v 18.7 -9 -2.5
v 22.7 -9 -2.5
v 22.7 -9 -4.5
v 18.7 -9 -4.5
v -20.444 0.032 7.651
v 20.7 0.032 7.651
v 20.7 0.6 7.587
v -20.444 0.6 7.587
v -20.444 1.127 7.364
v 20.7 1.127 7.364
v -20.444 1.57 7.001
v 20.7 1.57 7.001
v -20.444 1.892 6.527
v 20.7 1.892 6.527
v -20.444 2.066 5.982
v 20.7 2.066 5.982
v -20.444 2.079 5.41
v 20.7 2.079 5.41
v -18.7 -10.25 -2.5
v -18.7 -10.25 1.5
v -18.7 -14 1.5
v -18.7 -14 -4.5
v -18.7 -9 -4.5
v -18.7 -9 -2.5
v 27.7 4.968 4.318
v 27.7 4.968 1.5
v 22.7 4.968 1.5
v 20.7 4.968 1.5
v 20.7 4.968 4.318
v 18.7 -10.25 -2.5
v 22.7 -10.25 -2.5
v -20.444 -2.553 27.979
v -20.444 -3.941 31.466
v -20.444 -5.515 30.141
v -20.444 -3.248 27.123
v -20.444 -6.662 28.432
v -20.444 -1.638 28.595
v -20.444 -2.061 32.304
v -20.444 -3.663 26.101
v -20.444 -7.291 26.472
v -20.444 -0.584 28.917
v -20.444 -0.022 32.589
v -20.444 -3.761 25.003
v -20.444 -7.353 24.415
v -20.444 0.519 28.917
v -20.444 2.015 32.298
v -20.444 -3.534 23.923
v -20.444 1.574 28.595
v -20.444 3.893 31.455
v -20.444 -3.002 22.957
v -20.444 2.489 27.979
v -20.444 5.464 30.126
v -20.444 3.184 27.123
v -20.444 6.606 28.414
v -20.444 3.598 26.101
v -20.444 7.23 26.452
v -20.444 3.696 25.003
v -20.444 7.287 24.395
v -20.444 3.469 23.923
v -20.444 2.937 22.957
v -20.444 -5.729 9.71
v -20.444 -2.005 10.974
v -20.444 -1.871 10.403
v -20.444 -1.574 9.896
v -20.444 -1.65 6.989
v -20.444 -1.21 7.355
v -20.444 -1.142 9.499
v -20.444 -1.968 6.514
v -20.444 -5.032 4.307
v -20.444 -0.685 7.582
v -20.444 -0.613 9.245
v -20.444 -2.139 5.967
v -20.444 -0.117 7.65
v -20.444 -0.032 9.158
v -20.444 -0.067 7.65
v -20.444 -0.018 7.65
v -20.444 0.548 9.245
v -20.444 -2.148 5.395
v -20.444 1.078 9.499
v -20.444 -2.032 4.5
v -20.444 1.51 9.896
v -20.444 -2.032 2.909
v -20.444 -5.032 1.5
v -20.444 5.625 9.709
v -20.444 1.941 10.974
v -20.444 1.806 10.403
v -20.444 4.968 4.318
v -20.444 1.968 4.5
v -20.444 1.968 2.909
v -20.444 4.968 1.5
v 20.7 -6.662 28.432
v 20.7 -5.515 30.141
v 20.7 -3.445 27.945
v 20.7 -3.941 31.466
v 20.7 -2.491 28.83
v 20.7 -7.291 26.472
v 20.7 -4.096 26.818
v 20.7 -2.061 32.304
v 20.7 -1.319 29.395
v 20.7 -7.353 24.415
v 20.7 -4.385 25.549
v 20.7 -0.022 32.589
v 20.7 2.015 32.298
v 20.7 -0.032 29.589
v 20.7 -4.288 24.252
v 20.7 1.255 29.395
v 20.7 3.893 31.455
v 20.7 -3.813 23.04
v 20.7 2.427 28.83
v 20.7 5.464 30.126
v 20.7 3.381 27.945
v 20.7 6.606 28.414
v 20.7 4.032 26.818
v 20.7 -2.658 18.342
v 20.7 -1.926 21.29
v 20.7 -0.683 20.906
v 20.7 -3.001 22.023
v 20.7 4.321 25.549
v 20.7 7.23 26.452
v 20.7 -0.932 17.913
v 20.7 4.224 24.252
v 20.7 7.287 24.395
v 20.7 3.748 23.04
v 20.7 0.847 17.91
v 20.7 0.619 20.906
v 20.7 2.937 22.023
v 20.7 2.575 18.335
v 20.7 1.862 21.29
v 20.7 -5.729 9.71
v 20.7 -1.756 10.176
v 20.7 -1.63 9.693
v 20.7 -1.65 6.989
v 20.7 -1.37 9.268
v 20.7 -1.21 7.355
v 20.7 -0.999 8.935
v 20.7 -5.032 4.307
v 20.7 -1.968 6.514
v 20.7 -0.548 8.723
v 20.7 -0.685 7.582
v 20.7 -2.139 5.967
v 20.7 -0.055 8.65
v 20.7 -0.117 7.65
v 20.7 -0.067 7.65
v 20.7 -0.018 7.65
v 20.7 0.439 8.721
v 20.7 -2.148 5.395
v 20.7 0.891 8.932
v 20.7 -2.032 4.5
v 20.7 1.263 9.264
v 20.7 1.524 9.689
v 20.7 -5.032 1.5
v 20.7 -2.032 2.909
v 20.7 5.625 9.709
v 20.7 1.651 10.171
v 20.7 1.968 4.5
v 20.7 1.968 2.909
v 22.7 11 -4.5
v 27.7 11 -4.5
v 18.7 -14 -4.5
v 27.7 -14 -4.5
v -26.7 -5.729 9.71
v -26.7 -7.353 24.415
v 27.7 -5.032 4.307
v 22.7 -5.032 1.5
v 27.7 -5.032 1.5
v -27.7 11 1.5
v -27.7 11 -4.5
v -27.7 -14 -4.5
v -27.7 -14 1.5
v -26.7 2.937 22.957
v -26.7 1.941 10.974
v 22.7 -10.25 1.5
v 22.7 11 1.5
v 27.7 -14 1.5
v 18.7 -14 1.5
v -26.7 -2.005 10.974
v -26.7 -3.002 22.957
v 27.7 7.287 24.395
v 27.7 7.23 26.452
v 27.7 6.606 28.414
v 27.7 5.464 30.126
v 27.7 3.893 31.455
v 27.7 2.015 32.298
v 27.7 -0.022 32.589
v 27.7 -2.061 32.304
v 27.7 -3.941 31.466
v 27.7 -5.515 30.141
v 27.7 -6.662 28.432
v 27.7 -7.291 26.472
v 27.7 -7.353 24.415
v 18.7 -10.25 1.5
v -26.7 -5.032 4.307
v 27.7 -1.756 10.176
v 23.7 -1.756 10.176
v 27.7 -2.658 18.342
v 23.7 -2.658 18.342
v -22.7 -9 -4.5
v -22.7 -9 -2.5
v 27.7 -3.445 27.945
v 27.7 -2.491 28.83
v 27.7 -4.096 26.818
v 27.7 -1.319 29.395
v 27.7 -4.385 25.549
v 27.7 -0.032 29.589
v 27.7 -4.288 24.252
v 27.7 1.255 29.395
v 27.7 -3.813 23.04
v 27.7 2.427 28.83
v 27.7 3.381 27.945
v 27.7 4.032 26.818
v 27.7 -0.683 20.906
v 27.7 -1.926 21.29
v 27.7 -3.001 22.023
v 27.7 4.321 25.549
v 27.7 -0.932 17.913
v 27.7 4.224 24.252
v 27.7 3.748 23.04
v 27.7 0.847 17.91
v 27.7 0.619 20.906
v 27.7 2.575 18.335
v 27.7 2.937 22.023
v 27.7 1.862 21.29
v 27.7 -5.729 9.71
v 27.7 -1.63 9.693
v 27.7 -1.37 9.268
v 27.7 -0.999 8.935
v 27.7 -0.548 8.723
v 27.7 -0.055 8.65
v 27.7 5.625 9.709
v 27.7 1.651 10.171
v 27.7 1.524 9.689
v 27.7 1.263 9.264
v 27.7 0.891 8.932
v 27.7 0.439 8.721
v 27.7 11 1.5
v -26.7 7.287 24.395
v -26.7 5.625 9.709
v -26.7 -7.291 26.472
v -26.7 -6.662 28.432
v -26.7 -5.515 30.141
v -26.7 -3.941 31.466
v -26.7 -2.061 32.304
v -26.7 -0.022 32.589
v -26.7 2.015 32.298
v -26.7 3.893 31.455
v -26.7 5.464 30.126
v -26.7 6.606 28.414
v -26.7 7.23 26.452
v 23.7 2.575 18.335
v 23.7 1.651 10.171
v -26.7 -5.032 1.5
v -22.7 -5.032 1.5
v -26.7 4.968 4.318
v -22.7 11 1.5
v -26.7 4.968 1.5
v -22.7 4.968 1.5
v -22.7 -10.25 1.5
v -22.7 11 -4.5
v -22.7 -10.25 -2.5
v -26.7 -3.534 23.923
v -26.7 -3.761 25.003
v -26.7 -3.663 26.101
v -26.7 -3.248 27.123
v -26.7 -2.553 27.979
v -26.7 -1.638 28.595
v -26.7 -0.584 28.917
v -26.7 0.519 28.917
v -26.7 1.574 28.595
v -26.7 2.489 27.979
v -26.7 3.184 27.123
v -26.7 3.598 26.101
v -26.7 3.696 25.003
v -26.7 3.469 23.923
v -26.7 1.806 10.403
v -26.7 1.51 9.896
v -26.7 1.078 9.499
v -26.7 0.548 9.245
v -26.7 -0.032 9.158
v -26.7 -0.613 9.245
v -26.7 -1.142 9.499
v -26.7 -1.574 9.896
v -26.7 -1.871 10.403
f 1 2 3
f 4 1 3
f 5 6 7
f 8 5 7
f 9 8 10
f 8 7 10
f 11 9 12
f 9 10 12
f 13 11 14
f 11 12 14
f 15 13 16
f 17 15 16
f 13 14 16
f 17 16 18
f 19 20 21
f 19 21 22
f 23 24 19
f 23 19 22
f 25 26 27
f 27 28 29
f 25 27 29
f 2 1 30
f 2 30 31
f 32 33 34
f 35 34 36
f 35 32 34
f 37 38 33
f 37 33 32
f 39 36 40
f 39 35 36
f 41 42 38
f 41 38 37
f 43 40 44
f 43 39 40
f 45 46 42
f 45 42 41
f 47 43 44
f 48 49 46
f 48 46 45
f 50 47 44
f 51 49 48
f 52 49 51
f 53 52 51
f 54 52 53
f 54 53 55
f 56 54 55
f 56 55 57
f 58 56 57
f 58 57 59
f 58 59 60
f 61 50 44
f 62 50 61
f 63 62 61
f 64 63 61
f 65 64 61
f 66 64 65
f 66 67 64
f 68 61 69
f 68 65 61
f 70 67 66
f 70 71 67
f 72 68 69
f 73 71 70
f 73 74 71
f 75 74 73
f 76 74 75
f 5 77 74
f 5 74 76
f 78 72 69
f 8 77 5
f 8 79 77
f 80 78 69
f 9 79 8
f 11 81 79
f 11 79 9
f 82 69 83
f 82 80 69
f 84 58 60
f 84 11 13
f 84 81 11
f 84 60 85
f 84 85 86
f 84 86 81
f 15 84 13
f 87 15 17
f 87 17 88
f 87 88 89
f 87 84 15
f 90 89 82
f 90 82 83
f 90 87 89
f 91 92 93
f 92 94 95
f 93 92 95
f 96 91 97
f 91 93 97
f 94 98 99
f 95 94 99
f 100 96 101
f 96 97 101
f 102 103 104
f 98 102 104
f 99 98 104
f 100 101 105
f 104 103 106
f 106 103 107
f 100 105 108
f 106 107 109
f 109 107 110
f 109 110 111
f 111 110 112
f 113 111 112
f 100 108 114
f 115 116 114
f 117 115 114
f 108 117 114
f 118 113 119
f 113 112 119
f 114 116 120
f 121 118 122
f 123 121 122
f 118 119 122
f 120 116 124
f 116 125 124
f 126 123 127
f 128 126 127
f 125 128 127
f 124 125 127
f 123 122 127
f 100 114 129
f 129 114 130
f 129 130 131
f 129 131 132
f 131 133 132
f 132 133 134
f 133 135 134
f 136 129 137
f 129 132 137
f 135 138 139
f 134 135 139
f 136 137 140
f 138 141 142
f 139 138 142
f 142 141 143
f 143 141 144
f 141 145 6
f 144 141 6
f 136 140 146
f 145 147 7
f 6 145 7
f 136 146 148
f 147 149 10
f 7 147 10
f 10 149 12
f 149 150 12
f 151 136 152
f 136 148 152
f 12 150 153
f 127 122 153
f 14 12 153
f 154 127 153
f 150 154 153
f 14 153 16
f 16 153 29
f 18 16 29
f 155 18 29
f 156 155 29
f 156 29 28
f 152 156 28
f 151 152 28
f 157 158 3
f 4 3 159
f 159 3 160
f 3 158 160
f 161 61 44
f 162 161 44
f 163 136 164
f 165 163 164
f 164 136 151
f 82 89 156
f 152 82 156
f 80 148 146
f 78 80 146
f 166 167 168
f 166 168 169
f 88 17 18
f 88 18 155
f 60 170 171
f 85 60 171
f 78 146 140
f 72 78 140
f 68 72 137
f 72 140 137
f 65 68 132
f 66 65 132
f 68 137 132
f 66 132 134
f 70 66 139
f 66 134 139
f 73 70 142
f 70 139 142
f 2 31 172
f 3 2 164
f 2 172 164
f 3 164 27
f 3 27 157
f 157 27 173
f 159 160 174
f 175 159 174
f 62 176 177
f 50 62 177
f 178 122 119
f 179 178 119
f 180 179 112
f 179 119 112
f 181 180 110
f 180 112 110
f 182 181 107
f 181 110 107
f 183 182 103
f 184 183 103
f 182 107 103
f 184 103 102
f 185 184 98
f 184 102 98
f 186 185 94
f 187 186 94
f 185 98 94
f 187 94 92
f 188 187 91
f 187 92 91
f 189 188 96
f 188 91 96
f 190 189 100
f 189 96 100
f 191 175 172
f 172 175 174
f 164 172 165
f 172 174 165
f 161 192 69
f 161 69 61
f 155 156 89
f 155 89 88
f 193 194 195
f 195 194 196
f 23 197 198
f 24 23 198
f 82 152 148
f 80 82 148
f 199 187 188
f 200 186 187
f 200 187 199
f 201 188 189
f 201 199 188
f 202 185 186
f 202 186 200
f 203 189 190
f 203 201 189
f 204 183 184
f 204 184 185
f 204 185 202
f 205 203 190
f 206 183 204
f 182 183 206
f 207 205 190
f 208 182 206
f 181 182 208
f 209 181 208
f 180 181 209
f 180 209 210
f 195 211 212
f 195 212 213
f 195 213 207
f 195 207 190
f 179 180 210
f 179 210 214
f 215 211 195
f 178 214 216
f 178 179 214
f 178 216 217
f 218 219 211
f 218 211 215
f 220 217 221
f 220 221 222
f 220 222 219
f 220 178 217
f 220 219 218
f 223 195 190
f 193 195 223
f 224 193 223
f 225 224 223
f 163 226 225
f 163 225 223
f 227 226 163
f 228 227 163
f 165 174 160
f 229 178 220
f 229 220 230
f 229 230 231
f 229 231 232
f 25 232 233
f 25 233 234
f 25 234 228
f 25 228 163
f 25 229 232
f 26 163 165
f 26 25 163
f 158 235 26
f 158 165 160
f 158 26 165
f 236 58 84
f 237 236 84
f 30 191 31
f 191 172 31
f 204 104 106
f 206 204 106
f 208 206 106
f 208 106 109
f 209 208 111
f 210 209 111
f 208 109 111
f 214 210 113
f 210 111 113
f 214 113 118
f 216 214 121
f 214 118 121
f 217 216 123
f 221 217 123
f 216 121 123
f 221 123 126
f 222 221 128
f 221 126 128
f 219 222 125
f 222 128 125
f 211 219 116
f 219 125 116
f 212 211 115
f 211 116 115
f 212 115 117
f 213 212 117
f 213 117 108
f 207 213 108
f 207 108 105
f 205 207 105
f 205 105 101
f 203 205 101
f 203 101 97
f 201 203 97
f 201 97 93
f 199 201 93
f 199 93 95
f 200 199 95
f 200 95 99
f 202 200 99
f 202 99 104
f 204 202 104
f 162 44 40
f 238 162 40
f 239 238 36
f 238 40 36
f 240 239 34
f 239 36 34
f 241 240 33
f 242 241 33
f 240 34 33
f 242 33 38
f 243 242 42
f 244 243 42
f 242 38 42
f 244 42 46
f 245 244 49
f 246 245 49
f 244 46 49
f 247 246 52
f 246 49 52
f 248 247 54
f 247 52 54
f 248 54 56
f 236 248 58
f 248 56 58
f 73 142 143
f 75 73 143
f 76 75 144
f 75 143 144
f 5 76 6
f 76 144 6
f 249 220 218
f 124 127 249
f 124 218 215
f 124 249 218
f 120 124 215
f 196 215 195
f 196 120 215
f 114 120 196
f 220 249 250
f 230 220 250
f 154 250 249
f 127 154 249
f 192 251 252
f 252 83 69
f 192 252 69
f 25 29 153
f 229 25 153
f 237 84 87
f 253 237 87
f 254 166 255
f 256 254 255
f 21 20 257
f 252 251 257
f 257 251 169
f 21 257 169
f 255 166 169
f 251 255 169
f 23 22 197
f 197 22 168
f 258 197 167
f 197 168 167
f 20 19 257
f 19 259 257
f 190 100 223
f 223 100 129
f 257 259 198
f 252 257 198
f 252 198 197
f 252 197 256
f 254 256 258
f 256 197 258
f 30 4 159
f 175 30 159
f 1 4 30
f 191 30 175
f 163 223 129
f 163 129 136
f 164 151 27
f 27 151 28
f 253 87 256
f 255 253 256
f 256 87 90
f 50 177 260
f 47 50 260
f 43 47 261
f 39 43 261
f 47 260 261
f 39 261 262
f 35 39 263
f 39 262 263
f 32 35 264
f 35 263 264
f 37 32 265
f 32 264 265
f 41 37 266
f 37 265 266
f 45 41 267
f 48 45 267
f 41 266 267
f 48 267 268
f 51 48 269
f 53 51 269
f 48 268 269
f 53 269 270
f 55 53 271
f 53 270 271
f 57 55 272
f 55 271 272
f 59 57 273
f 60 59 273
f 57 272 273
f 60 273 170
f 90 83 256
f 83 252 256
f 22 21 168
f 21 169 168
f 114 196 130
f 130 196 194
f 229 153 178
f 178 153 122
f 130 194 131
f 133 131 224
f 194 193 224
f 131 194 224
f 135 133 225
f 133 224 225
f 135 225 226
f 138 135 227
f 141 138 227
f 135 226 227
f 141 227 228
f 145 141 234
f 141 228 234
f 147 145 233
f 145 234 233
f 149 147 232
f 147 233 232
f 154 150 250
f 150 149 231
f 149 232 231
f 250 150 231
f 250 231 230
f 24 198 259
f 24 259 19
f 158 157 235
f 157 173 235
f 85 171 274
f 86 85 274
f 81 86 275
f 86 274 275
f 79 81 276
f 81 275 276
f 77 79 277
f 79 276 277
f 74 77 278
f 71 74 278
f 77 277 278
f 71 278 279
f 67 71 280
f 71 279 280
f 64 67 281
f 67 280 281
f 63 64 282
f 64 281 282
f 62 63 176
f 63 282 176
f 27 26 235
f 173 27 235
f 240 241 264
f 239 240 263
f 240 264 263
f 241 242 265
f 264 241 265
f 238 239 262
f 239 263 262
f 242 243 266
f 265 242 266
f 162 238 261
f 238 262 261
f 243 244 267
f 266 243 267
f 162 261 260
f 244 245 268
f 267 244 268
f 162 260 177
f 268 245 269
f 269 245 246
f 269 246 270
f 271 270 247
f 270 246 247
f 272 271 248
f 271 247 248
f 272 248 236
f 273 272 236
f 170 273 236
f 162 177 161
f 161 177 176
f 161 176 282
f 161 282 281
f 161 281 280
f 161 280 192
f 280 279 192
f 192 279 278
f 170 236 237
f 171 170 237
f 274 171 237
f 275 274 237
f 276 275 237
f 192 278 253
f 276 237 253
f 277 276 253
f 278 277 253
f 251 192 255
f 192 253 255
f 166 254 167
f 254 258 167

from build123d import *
from build123d.topology import SkipClean

# Parameters (mm, degrees)
SKETCH1_W                   = 45
SKETCH1_H                   = 20.5
SKETCH1_R                   = 1.05
BOSS_EXTRUDE1_DEPTH         = 1.75
SKETCH3_W                   = 1.5
SKETCH3_H                   = 22
BOSS_EXTRUDE2_DEPTH         = 1.5
BOSS_EXTRUDE2_2_DEPTH       = 1.5
SKETCH4_W                   = 3
SKETCH4_H                   = 0.75
BOSS_EXTRUDE3_DEPTH         = 1
SKETCH5_W                   = 3
SKETCH5_H                   = 0.75
BOSS_EXTRUDE4_DEPTH         = 1
SKETCH6_W                   = 2.5
SKETCH6_H                   = 2
BOSS_EXTRUDE5_DEPTH         = 1
BODY_MOVE_COPY1_START       = 1.25
BODY_MOVE_COPY1_OUTLINE_W   = 45
BODY_MOVE_COPY1_OUTLINE_H   = 20.5
BODY_MOVE_COPY1_OUTLINE_R   = 1.05
BODY_MOVE_COPY1_DEPTH       = 0.5
BODY_MOVE_COPY1_START_2     = -0.5
BODY_MOVE_COPY1_2_OUTLINE_W = 45
BODY_MOVE_COPY1_2_OUTLINE_H = 20.5
BODY_MOVE_COPY1_2_OUTLINE_R = 1.05
BODY_MOVE_COPY1_2_DEPTH     = 0.5
SKETCH8_W                   = 1.5
SKETCH8_H                   = 4
BOSS_EXTRUDE7_DEPTH         = 2
SKETCH9_W                   = 47.4
SKETCH9_H                   = 4
BOSS_EXTRUDE8_DEPTH         = 1
BOSS_EXTRUDE9_DEPTH         = 3.256
BOSS_EXTRUDE10_DEPTH        = 3
SKETCH13_R                  = 4.3655
SKETCH13_R_2                = 3.3655
BOSS_EXTRUDE11_DEPTH        = 3
SKETCH16_R                  = 4.3655
SKETCH16_R_2                = 3.3655
BOSS_EXTRUDE12_DEPTH        = 3
SKETCH17_W                  = 5
SKETCH17_H                  = 22
BOSS_EXTRUDE13_DEPTH        = 3
BOSS_EXTRUDE14_START        = -44.4
BOSS_EXTRUDE14_OUTLINE_W    = 2
BOSS_EXTRUDE14_OUTLINE_H    = 4
BOSS_EXTRUDE14_DEPTH        = 42.9
FILLET1_R                   = 2
SKETCH20_W                  = 6
SKETCH20_H                  = 3
BOSS_EXTRUDE15_DEPTH        = 3
BOSS_EXTRUDE16_DEPTH        = 3
BOSS_EXTRUDE17_DEPTH        = 3
BOSS_EXTRUDE18_DEPTH        = 3
BOSS_EXTRUDE19_START        = -3.256
BOSS_EXTRUDE19_DEPTH        = 6.256
CUT_EXTRUDE1_DEPTH          = 6.256
BOSS_EXTRUDE21_START        = -3
SKETCH26_R                  = 3.3655
BOSS_EXTRUDE21_DEPTH        = 7
SKETCH27_R                  = 4.3655
SKETCH27_R_2                = 3.3655
CUT_EXTRUDE2_DEPTH          = 3
SKETCH28_R                  = 5.378785713
SKETCH28_R_2                = 3.3655
BOSS_EXTRUDE22_DEPTH        = 7
SKETCH29_R                  = 3.730648532
CUT_EXTRUDE3_DEPTH          = 7
SKETCH31_W                  = 45.4
SKETCH31_H                  = 4
CUT_EXTRUDE4_DEPTH          = 21.25
SKETCH32_W                  = 41.144
SKETCH32_H                  = 1.408973542
CUT_EXTRUDE5_DEPTH          = 13.032142153
SKETCH33_R                  = 4.3655
CUT_EXTRUDE6_DEPTH          = 10
SKETCH34_R                  = 7.3655
SKETCH34_R_2                = 4.3655
BOSS_EXTRUDE23_DEPTH        = 7
BOSS_EXTRUDE24_DEPTH        = 6.256


# Read off the part's stored shape, not the designer's step: Body-Move/Copy1, Boss-Extrude14
with BuildPart() as part:
    # Sketch1 → Boss-Extrude1 (new body)
    with BuildSketch(Plane.XY):
        Rectangle(SKETCH1_W, SKETCH1_H)
        with Locations((20.45, -8.2)):
            Circle(SKETCH1_R, mode=Mode.SUBTRACT)
        with Locations((-20.45, 8.2)):
            Circle(SKETCH1_R, mode=Mode.SUBTRACT)
    extrude(amount=BOSS_EXTRUDE1_DEPTH)

    # Body-Move/Copy1 outline → Body-Move/Copy1 (cut)
    with BuildSketch(Plane.XY.offset(BODY_MOVE_COPY1_START)):
        Rectangle(BODY_MOVE_COPY1_OUTLINE_W, BODY_MOVE_COPY1_OUTLINE_H)
        with Locations((20.45, -8.2)):
            Circle(BODY_MOVE_COPY1_OUTLINE_R, mode=Mode.SUBTRACT)
        with Locations((-20.45, 8.2)):
            Circle(BODY_MOVE_COPY1_OUTLINE_R, mode=Mode.SUBTRACT)
    extrude(amount=BODY_MOVE_COPY1_DEPTH, mode=Mode.SUBTRACT)

    # Body-Move_Copy1 2 outline → Body-Move_Copy1 2 (add)
    with BuildSketch(Plane.XY.offset(BODY_MOVE_COPY1_START_2)):
        Rectangle(BODY_MOVE_COPY1_2_OUTLINE_W, BODY_MOVE_COPY1_2_OUTLINE_H)
        with Locations((20.45, -8.2)):
            Circle(BODY_MOVE_COPY1_2_OUTLINE_R, mode=Mode.SUBTRACT)
        with Locations((-20.45, 8.2)):
            Circle(BODY_MOVE_COPY1_2_OUTLINE_R, mode=Mode.SUBTRACT)
    extrude(amount=BODY_MOVE_COPY1_2_DEPTH)


with BuildPart() as body_2:
    # Sketch3 → Boss-Extrude2 (new, symmetric)
    with BuildSketch(Plane(origin=(0, 0, 0), x_dir=(-1, 0, 0), z_dir=(0, 0, -1))):
        with Locations((-23.45, 0)):
            Rectangle(SKETCH3_W, SKETCH3_H)
    extrude(amount=BOSS_EXTRUDE2_DEPTH, both=True)

    # Sketch4 → Boss-Extrude3 (add)
    with BuildSketch(Plane.ZY.offset(-22.7)):
        with Locations((0, -10.625)):
            Rectangle(SKETCH4_W, SKETCH4_H)
    extrude(amount=BOSS_EXTRUDE3_DEPTH)



with BuildPart() as body_3:
    # Sketch3 → Boss-Extrude2 2 (new, symmetric)
    with BuildSketch(Plane(origin=(0, 0, 0), x_dir=(-1, 0, 0), z_dir=(0, 0, -1))):
        with Locations((23.45, 0)):
            Rectangle(SKETCH3_W, SKETCH3_H)
    extrude(amount=BOSS_EXTRUDE2_2_DEPTH, both=True)

    # Sketch5 → Boss-Extrude4 (add)
    with BuildSketch(Plane(origin=(-22.7, 0, 0), x_dir=(0, 0, -1), z_dir=(1, 0, 0))):
        with Locations((0, -10.625)):
            Rectangle(SKETCH5_W, SKETCH5_H)
    extrude(amount=BOSS_EXTRUDE4_DEPTH)


with BuildPart() as body_2_1:
    add(body_2.part)

    add(body_3.part)  # Boss-Extrude5 merges body 3
    # Sketch6 → Boss-Extrude5 (add)
    with BuildSketch(Plane(origin=(0, 0, -1.5), x_dir=(-1, 0, 0), z_dir=(0, 0, -1))):
        with Locations((-22.95, -10)):
            Rectangle(SKETCH6_W, SKETCH6_H)
        with Locations((22.95, -10)):
            Rectangle(SKETCH6_W, SKETCH6_H)
    extrude(amount=-BOSS_EXTRUDE5_DEPTH)

    # Sketch8 → Boss-Extrude7 (add)
    with BuildSketch(Plane.XY.offset(1.5)):
        with Locations((-22.95, -0.032142153)):
            Rectangle(SKETCH8_W, SKETCH8_H)
        with Locations((22.95, -0.032142153)):
            Rectangle(SKETCH8_W, SKETCH8_H)
    extrude(amount=BOSS_EXTRUDE7_DEPTH)

    # Sketch9 → Boss-Extrude8 (add)
    with BuildSketch(Plane.XY.offset(3.5)):
        with Locations((0, -0.032142153)):
            Rectangle(SKETCH9_W, SKETCH9_H)
    extrude(amount=BOSS_EXTRUDE8_DEPTH)

    # Sketch11 → Boss-Extrude9 (add)
    with BuildSketch(Plane.ZY.offset(23.7)):
        with BuildLine():
            Line((10.066137971, -2.750359304), (24.743901725, -4.371263733))
            ThreePointArc((24.743901725, -4.371263733), (29.588578443, -0.02623116), (24.732152942, 4.305665873))
            Line((24.732152942, 4.305665873), (10.058832491, 2.645019328))
            Line((10.058832491, 2.645019328), (4.5, 1.967857847))
            Line((4.5, 1.967857847), (4.5, -2.032142153))
            Line((4.5, -2.032142153), (10.066137971, -2.750359304))
        make_face()
        with BuildLine():
            ThreePointArc((24.853667095, -3.377306207), (28.588579359, -0.027585185), (24.844609591, 3.312009241))
            Line((24.844609591, 3.312009241), (10.17128914, 1.651362696))
            ThreePointArc((10.17128914, 1.651362696), (8.649597637, -0.054583074), (10.17590334, -1.756401778))
            Line((10.17590334, -1.756401778), (24.853667095, -3.377306207))
        make_face(mode=Mode.SUBTRACT)
    extrude(amount=-BOSS_EXTRUDE9_DEPTH)

    # Sketch12 → Boss-Extrude10 (add)
    with BuildSketch(Plane(origin=(23.7, 0, 0), x_dir=(0, 0, -1), z_dir=(1, 0, 0))):
        with BuildLine():
            Line((-24.732152942, 4.305665873), (-10.058832491, 2.645019328))
            Line((-10.058832491, 2.645019328), (-4.5, 1.967857847))
            Line((-4.5, 1.967857847), (-4.5, -2.032142153))
            Line((-4.5, -2.032142153), (-10.066137971, -2.750359304))
            Line((-10.066137971, -2.750359304), (-24.743901725, -4.371263733))
            ThreePointArc((-24.743901725, -4.371263733), (-29.588578443, -0.02623116), (-24.732152942, 4.305665873))
        make_face()
        with BuildLine():
            ThreePointArc((-10.17590334, -1.756401778), (-8.649597637, -0.054583074), (-10.17128914, 1.651362696))
            Line((-10.17128914, 1.651362696), (-24.844609591, 3.312009241))
            ThreePointArc((-24.844609591, 3.312009241), (-28.588579359, -0.027585185), (-24.853667095, -3.377306207))
            Line((-24.853667095, -3.377306207), (-10.17590334, -1.756401778))
        make_face(mode=Mode.SUBTRACT)
    extrude(amount=-BOSS_EXTRUDE10_DEPTH)

    # Sketch13 → Boss-Extrude11 (add)
    with BuildSketch(Plane(origin=(23.7, 0, 0), x_dir=(0, 0, -1), z_dir=(1, 0, 0))):
        with Locations((-25.223082444, -0.032142153)):
            Circle(SKETCH13_R)
        with Locations((-25.223082444, -0.032142153)):
            Circle(SKETCH13_R_2, mode=Mode.SUBTRACT)
    extrude(amount=-BOSS_EXTRUDE11_DEPTH)

    # Sketch16 → Boss-Extrude12 (add)
    with BuildSketch(Plane.ZY.offset(-20.7)):
        with Locations(Location((25.223082444, -0.032142153, 0), (0, 0, 136.019369677))):
            Circle(SKETCH16_R)
        with Locations(Location((25.223082444, -0.032142153, 0), (0, 0, 180))):
            Circle(SKETCH16_R_2, mode=Mode.SUBTRACT)
    extrude(amount=BOSS_EXTRUDE12_DEPTH)

    # Sketch17 → Boss-Extrude13 (add)
    with BuildSketch(Plane(origin=(0, 0, -1.5), x_dir=(-1, 0, 0), z_dir=(0, 0, -1))):
        with Locations((-25.2, 0)):
            Rectangle(SKETCH17_W, SKETCH17_H)
        with Locations((25.2, 0)):
            Rectangle(SKETCH17_W, SKETCH17_H)
    extrude(amount=-BOSS_EXTRUDE13_DEPTH)

    # Boss-Extrude14 outline → Boss-Extrude14 (add)
    with BuildSketch(Plane.ZY.offset(23.7).offset(BOSS_EXTRUDE14_START)):
        with Locations((2.5, -0.032142153)):
            Rectangle(BOSS_EXTRUDE14_OUTLINE_W, BOSS_EXTRUDE14_OUTLINE_H)
        with BuildLine():
            Line((10.012890898, 2.639422851), (4.5, 1.967857847))
            Line((4.5, 1.967857847), (4.5, -2.032142153))
            Line((4.5, -2.032142153), (9.967409055, -2.737619986))
            ThreePointArc((9.967409055, -2.737619986), (7.649693167, -0.029301759), (10.012890898, 2.639422851))
        make_face()
    extrude(amount=BOSS_EXTRUDE14_DEPTH)

    # Fillet1
    # the kernel refuses this fillet: 2 mm, written as the material it takes off along each edge
    with BuildSketch(Plane(origin=(20.7, -2.737619986, 9.967409055), x_dir=(0, 0.7492110038942702, -0.6623313911054948), z_dir=(-1, 0, 0))) as fillet1_piece_1:
        with BuildLine():
            CenterArc((4.787077901, 1.529415678), FILLET1_R, 131.16964068, 98.711366411)
            Line((3.47049653, 3.034943324), (0, 0))
            ThreePointArc((0, 0), (1.749161793, 0.638700571), (3.498323587, 0))
        make_face()
    extrude(amount=41.144, mode=Mode.SUBTRACT)
    with BuildSketch(Plane(origin=(20.7, 2.639422851, 10.012890898), x_dir=(0, -0.7411764808079845, -0.6713102295489705), z_dir=(-1, 0, 0))) as fillet1_piece_2:
        with BuildLine():
            CenterArc((4.814675065, -1.523124197), FILLET1_R, 130.397896763, 98.715764742)
            Line((3.505553923, -3.035143323), (0, 0))
            ThreePointArc((0, 0), (1.759245587, -0.647239684), (3.518491173, 0))
        make_face()
    extrude(amount=41.144, mode=Mode.SUBTRACT)

    # Sketch20 → Boss-Extrude15 (add)
    with BuildSketch(Plane.XZ.offset(11)):
        with Locations((-24.7, 0)):
            Rectangle(SKETCH20_W, SKETCH20_H)
        with Locations((24.7, 0)):
            Rectangle(SKETCH20_W, SKETCH20_H)
    extrude(amount=BOSS_EXTRUDE15_DEPTH)

    # Sketch21 → Boss-Extrude16 (add)
    with BuildSketch(Plane(origin=(0, 0, -1.5), x_dir=(-1, 0, 0), z_dir=(0, 0, -1))):
        Polygon((-21.7, -9), (-22.7, -9), (-22.7, 11), (-27.7, 11), (-27.7, -14), (-21.7, -14), align=None)
        Polygon((21.7, -9), (21.7, -14), (27.7, -14), (27.7, 11), (22.7, 11), (22.7, -9), align=None)
    extrude(amount=BOSS_EXTRUDE16_DEPTH)

    # Sketch22 → Boss-Extrude17 (add)
    with BuildSketch(Plane.ZY.offset(-21.7)):
        Polygon((1.5, -14), (1.5, -10.25), (-0.5, -10.25), (-0.5, -9), (-4.5, -9), (-4.5, -14), align=None)
    extrude(amount=BOSS_EXTRUDE17_DEPTH)

    # Sketch23 → Boss-Extrude18 (add)
    with BuildSketch(Plane(origin=(-21.7, 0, 0), x_dir=(0, 0, -1), z_dir=(1, 0, 0))):
        Polygon((-1.5, -10.25), (-1.5, -14), (4.5, -14), (4.5, -9), (0.5, -9), (0.5, -10.25), align=None)
    extrude(amount=BOSS_EXTRUDE18_DEPTH)

    # Sketch24 → Boss-Extrude19 (add)
    with SkipClean():  # the faces are left unmerged after this step: merging them gives an invalid solid
        with BuildSketch(Plane.ZY.offset(23.7).offset(BOSS_EXTRUDE19_START)):
            with BuildLine():
                Line((1.5, 4.967857847), (1.5, -5.032142153))
                Line((1.5, -5.032142153), (4.307249044, -5.032142153))
                Line((4.307249044, -5.032142153), (9.709501407, -5.729212603))
                Line((9.709501407, -5.729212603), (24.414605618, -7.353136312))
                ThreePointArc((24.414605618, -7.353136312), (32.588575693, -0.022169088), (24.394782994, 7.286635769))
                Line((24.394782994, 7.286635769), (9.708756206, 5.624551189))
                Line((9.708756206, 5.624551189), (4.317947084, 4.967857847))
                Line((4.317947084, 4.967857847), (1.5, 4.967857847))
            make_face()
            with BuildLine():
                Line((24.853667095, -3.377306207), (10.17590334, -1.756401778))
                ThreePointArc((10.17590334, -1.756401778), (8.649597637, -0.054583074), (10.17128914, 1.651362696))
                Line((10.17128914, 1.651362696), (24.844609591, 3.312009241))
                ThreePointArc((24.844609591, 3.312009241), (28.588579359, -0.027585185), (24.853667095, -3.377306207))
            make_face(mode=Mode.SUBTRACT)
        extrude(amount=BOSS_EXTRUDE19_DEPTH)

    # Sketch25 → Cut-Extrude1 (cut)
    with BuildSketch(Plane.ZY.offset(26.7)):
        with BuildLine():
            Line((24.732152942, 4.305665873), (10.058832491, 2.645019328))
            ThreePointArc((10.058832491, 2.645019328), (7.649598554, -0.055937098), (10.066137971, -2.750359304))
            Line((10.066137971, -2.750359304), (24.743901725, -4.371263733))
            ThreePointArc((24.743901725, -4.371263733), (29.588578443, -0.02623116), (24.732152942, 4.305665873))
        make_face()
        with BuildLine():
            ThreePointArc((10.17590334, -1.756401778), (8.649597637, -0.054583074), (10.17128914, 1.651362696))
            Line((10.17128914, 1.651362696), (24.844609591, 3.312009241))
            ThreePointArc((24.844609591, 3.312009241), (28.588579359, -0.027585185), (24.853667095, -3.377306207))
            Line((24.853667095, -3.377306207), (10.17590334, -1.756401778))
        make_face(mode=Mode.SUBTRACT)
    extrude(amount=-CUT_EXTRUDE1_DEPTH, mode=Mode.SUBTRACT)

    # Sketch26 → Boss-Extrude21 (add)
    with SkipClean():  # the faces are left unmerged after this step: merging them gives an invalid solid
        with BuildSketch(Plane(origin=(23.7, 0, 0), x_dir=(0, 0, -1), z_dir=(1, 0, 0)).offset(BOSS_EXTRUDE21_START)):
            with BuildLine():
                Line((-1.5, 4.967857847), (-4.317947084, 4.967857847))
                Line((-4.317947084, 4.967857847), (-9.708756206, 5.624551189))
                Line((-9.708756206, 5.624551189), (-24.394782994, 7.286635769))
                ThreePointArc((-24.394782994, 7.286635769), (-32.588575693, -0.022169088), (-24.414605618, -7.353136312))
                Line((-24.414605618, -7.353136312), (-9.709501407, -5.729212603))
                Line((-9.709501407, -5.729212603), (-4.307249044, -5.032142153))
                Line((-4.307249044, -5.032142153), (-1.5, -5.032142153))
                Line((-1.5, -5.032142153), (-1.5, 4.967857847))
            make_face()
            with BuildLine():
                ThreePointArc((-10.17128914, 1.651362696), (-8.649597637, -0.054583074), (-10.17590334, -1.756401778))
                Line((-10.17590334, -1.756401778), (-22.090000411, -3.072107156))
                ThreePointArc((-22.090000411, -3.072107156), (-20.857586446, -0.038053146), (-22.081779534, 2.999327173))
                Line((-22.081779534, 2.999327173), (-10.17128914, 1.651362696))
            make_face(mode=Mode.SUBTRACT)
            with Locations(Location((-25.223082444, -0.032142153, 0), (0, 0, 90))):
                Circle(SKETCH26_R, mode=Mode.SUBTRACT)
        extrude(amount=BOSS_EXTRUDE21_DEPTH)

    # Sketch27 → Cut-Extrude2 (cut)
    with SkipClean():  # the faces are left unmerged after this step: merging them gives an invalid solid
        with BuildSketch(Plane.ZY.offset(-17.7)):
            with Locations((25.223082444, -0.032142153)):
                Circle(SKETCH27_R)
            with Locations(Location((25.223082444, -0.032142153, 0), (0, 0, 180))):
                Circle(SKETCH27_R_2, mode=Mode.SUBTRACT)
        extrude(amount=-CUT_EXTRUDE2_DEPTH, mode=Mode.SUBTRACT)

    # Sketch28 → Boss-Extrude22 (add)
    with BuildSketch(Plane(origin=(27.7, 0, 0), x_dir=(0, 0, -1), z_dir=(1, 0, 0))):
        with Locations((-25.223082444, -0.032142153)):
            Circle(SKETCH28_R)
        with Locations((-25.223082444, -0.032142153)):
            Circle(SKETCH28_R_2, mode=Mode.SUBTRACT)
    extrude(amount=-BOSS_EXTRUDE22_DEPTH)

    # Sketch29 → Cut-Extrude3 (cut)
    with BuildSketch(Plane(origin=(27.7, 0, 0), x_dir=(0, 0, -1), z_dir=(1, 0, 0))):
        with Locations(Location((-25.223082444, -0.032142153, 0), (0, 0, 90))):
            Circle(SKETCH29_R)
    extrude(amount=-CUT_EXTRUDE3_DEPTH, mode=Mode.SUBTRACT)

    # Sketch31 → Cut-Extrude4 (cut)
    with BuildSketch(Plane(origin=(0, 11, 0), x_dir=(1, 0, 0), z_dir=(0, 1, 0))):
        with Locations((0, 0.5)):
            Rectangle(SKETCH31_W, SKETCH31_H)
    extrude(amount=-CUT_EXTRUDE4_DEPTH, mode=Mode.SUBTRACT)

    # Sketch32 → Cut-Extrude5 (cut)
    with BuildSketch(Plane(origin=(0, 11, 0), x_dir=(1, 0, 0), z_dir=(0, 1, 0))):
        with Locations((0.128, -2.204486771)):
            Rectangle(SKETCH32_W, SKETCH32_H)
    extrude(amount=-CUT_EXTRUDE5_DEPTH, mode=Mode.SUBTRACT)

    # Sketch33 → Cut-Extrude6 (cut)
    with BuildSketch(Plane.ZY.offset(-20.7)):
        with Locations((25.223082444, -0.032142153)):
            Circle(SKETCH33_R)
    extrude(amount=-CUT_EXTRUDE6_DEPTH, mode=Mode.SUBTRACT)

    # Sketch34 → Boss-Extrude23 (add)
    with BuildSketch(Plane.ZY.offset(-20.7)):
        with Locations((25.223082444, -0.032142153)):
            Circle(SKETCH34_R)
        with Locations((25.223082444, -0.032142153)):
            Circle(SKETCH34_R_2, mode=Mode.SUBTRACT)
    extrude(amount=-BOSS_EXTRUDE23_DEPTH)

    # Sketch35 → Boss-Extrude24 (add)
    with BuildSketch(Plane.ZY.offset(26.7)):
        with BuildLine():
            Line((10.058832491, 2.645019328), (24.732152942, 4.305665873))
            ThreePointArc((24.732152942, 4.305665873), (29.588578443, -0.02623116), (24.743901725, -4.371263733))
            Line((24.743901725, -4.371263733), (10.066137971, -2.750359304))
            ThreePointArc((10.066137971, -2.750359304), (7.649598554, -0.055937098), (10.058832491, 2.645019328))
        make_face()
        with BuildLine():
            ThreePointArc((22.957489609, -3.001538406), (28.958082444, -0.032142153), (22.957489609, 2.937254099))
            Line((22.957489609, 2.937254099), (10.974047703, 1.941051351))
            ThreePointArc((10.974047703, 1.941051351), (9.158082444, -0.032142153), (10.974047703, -2.005335657))
            Line((10.974047703, -2.005335657), (22.957489609, -3.001538406))
        make_face(mode=Mode.SUBTRACT)
    extrude(amount=-BOSS_EXTRUDE24_DEPTH)


solid = body_2_1.part
